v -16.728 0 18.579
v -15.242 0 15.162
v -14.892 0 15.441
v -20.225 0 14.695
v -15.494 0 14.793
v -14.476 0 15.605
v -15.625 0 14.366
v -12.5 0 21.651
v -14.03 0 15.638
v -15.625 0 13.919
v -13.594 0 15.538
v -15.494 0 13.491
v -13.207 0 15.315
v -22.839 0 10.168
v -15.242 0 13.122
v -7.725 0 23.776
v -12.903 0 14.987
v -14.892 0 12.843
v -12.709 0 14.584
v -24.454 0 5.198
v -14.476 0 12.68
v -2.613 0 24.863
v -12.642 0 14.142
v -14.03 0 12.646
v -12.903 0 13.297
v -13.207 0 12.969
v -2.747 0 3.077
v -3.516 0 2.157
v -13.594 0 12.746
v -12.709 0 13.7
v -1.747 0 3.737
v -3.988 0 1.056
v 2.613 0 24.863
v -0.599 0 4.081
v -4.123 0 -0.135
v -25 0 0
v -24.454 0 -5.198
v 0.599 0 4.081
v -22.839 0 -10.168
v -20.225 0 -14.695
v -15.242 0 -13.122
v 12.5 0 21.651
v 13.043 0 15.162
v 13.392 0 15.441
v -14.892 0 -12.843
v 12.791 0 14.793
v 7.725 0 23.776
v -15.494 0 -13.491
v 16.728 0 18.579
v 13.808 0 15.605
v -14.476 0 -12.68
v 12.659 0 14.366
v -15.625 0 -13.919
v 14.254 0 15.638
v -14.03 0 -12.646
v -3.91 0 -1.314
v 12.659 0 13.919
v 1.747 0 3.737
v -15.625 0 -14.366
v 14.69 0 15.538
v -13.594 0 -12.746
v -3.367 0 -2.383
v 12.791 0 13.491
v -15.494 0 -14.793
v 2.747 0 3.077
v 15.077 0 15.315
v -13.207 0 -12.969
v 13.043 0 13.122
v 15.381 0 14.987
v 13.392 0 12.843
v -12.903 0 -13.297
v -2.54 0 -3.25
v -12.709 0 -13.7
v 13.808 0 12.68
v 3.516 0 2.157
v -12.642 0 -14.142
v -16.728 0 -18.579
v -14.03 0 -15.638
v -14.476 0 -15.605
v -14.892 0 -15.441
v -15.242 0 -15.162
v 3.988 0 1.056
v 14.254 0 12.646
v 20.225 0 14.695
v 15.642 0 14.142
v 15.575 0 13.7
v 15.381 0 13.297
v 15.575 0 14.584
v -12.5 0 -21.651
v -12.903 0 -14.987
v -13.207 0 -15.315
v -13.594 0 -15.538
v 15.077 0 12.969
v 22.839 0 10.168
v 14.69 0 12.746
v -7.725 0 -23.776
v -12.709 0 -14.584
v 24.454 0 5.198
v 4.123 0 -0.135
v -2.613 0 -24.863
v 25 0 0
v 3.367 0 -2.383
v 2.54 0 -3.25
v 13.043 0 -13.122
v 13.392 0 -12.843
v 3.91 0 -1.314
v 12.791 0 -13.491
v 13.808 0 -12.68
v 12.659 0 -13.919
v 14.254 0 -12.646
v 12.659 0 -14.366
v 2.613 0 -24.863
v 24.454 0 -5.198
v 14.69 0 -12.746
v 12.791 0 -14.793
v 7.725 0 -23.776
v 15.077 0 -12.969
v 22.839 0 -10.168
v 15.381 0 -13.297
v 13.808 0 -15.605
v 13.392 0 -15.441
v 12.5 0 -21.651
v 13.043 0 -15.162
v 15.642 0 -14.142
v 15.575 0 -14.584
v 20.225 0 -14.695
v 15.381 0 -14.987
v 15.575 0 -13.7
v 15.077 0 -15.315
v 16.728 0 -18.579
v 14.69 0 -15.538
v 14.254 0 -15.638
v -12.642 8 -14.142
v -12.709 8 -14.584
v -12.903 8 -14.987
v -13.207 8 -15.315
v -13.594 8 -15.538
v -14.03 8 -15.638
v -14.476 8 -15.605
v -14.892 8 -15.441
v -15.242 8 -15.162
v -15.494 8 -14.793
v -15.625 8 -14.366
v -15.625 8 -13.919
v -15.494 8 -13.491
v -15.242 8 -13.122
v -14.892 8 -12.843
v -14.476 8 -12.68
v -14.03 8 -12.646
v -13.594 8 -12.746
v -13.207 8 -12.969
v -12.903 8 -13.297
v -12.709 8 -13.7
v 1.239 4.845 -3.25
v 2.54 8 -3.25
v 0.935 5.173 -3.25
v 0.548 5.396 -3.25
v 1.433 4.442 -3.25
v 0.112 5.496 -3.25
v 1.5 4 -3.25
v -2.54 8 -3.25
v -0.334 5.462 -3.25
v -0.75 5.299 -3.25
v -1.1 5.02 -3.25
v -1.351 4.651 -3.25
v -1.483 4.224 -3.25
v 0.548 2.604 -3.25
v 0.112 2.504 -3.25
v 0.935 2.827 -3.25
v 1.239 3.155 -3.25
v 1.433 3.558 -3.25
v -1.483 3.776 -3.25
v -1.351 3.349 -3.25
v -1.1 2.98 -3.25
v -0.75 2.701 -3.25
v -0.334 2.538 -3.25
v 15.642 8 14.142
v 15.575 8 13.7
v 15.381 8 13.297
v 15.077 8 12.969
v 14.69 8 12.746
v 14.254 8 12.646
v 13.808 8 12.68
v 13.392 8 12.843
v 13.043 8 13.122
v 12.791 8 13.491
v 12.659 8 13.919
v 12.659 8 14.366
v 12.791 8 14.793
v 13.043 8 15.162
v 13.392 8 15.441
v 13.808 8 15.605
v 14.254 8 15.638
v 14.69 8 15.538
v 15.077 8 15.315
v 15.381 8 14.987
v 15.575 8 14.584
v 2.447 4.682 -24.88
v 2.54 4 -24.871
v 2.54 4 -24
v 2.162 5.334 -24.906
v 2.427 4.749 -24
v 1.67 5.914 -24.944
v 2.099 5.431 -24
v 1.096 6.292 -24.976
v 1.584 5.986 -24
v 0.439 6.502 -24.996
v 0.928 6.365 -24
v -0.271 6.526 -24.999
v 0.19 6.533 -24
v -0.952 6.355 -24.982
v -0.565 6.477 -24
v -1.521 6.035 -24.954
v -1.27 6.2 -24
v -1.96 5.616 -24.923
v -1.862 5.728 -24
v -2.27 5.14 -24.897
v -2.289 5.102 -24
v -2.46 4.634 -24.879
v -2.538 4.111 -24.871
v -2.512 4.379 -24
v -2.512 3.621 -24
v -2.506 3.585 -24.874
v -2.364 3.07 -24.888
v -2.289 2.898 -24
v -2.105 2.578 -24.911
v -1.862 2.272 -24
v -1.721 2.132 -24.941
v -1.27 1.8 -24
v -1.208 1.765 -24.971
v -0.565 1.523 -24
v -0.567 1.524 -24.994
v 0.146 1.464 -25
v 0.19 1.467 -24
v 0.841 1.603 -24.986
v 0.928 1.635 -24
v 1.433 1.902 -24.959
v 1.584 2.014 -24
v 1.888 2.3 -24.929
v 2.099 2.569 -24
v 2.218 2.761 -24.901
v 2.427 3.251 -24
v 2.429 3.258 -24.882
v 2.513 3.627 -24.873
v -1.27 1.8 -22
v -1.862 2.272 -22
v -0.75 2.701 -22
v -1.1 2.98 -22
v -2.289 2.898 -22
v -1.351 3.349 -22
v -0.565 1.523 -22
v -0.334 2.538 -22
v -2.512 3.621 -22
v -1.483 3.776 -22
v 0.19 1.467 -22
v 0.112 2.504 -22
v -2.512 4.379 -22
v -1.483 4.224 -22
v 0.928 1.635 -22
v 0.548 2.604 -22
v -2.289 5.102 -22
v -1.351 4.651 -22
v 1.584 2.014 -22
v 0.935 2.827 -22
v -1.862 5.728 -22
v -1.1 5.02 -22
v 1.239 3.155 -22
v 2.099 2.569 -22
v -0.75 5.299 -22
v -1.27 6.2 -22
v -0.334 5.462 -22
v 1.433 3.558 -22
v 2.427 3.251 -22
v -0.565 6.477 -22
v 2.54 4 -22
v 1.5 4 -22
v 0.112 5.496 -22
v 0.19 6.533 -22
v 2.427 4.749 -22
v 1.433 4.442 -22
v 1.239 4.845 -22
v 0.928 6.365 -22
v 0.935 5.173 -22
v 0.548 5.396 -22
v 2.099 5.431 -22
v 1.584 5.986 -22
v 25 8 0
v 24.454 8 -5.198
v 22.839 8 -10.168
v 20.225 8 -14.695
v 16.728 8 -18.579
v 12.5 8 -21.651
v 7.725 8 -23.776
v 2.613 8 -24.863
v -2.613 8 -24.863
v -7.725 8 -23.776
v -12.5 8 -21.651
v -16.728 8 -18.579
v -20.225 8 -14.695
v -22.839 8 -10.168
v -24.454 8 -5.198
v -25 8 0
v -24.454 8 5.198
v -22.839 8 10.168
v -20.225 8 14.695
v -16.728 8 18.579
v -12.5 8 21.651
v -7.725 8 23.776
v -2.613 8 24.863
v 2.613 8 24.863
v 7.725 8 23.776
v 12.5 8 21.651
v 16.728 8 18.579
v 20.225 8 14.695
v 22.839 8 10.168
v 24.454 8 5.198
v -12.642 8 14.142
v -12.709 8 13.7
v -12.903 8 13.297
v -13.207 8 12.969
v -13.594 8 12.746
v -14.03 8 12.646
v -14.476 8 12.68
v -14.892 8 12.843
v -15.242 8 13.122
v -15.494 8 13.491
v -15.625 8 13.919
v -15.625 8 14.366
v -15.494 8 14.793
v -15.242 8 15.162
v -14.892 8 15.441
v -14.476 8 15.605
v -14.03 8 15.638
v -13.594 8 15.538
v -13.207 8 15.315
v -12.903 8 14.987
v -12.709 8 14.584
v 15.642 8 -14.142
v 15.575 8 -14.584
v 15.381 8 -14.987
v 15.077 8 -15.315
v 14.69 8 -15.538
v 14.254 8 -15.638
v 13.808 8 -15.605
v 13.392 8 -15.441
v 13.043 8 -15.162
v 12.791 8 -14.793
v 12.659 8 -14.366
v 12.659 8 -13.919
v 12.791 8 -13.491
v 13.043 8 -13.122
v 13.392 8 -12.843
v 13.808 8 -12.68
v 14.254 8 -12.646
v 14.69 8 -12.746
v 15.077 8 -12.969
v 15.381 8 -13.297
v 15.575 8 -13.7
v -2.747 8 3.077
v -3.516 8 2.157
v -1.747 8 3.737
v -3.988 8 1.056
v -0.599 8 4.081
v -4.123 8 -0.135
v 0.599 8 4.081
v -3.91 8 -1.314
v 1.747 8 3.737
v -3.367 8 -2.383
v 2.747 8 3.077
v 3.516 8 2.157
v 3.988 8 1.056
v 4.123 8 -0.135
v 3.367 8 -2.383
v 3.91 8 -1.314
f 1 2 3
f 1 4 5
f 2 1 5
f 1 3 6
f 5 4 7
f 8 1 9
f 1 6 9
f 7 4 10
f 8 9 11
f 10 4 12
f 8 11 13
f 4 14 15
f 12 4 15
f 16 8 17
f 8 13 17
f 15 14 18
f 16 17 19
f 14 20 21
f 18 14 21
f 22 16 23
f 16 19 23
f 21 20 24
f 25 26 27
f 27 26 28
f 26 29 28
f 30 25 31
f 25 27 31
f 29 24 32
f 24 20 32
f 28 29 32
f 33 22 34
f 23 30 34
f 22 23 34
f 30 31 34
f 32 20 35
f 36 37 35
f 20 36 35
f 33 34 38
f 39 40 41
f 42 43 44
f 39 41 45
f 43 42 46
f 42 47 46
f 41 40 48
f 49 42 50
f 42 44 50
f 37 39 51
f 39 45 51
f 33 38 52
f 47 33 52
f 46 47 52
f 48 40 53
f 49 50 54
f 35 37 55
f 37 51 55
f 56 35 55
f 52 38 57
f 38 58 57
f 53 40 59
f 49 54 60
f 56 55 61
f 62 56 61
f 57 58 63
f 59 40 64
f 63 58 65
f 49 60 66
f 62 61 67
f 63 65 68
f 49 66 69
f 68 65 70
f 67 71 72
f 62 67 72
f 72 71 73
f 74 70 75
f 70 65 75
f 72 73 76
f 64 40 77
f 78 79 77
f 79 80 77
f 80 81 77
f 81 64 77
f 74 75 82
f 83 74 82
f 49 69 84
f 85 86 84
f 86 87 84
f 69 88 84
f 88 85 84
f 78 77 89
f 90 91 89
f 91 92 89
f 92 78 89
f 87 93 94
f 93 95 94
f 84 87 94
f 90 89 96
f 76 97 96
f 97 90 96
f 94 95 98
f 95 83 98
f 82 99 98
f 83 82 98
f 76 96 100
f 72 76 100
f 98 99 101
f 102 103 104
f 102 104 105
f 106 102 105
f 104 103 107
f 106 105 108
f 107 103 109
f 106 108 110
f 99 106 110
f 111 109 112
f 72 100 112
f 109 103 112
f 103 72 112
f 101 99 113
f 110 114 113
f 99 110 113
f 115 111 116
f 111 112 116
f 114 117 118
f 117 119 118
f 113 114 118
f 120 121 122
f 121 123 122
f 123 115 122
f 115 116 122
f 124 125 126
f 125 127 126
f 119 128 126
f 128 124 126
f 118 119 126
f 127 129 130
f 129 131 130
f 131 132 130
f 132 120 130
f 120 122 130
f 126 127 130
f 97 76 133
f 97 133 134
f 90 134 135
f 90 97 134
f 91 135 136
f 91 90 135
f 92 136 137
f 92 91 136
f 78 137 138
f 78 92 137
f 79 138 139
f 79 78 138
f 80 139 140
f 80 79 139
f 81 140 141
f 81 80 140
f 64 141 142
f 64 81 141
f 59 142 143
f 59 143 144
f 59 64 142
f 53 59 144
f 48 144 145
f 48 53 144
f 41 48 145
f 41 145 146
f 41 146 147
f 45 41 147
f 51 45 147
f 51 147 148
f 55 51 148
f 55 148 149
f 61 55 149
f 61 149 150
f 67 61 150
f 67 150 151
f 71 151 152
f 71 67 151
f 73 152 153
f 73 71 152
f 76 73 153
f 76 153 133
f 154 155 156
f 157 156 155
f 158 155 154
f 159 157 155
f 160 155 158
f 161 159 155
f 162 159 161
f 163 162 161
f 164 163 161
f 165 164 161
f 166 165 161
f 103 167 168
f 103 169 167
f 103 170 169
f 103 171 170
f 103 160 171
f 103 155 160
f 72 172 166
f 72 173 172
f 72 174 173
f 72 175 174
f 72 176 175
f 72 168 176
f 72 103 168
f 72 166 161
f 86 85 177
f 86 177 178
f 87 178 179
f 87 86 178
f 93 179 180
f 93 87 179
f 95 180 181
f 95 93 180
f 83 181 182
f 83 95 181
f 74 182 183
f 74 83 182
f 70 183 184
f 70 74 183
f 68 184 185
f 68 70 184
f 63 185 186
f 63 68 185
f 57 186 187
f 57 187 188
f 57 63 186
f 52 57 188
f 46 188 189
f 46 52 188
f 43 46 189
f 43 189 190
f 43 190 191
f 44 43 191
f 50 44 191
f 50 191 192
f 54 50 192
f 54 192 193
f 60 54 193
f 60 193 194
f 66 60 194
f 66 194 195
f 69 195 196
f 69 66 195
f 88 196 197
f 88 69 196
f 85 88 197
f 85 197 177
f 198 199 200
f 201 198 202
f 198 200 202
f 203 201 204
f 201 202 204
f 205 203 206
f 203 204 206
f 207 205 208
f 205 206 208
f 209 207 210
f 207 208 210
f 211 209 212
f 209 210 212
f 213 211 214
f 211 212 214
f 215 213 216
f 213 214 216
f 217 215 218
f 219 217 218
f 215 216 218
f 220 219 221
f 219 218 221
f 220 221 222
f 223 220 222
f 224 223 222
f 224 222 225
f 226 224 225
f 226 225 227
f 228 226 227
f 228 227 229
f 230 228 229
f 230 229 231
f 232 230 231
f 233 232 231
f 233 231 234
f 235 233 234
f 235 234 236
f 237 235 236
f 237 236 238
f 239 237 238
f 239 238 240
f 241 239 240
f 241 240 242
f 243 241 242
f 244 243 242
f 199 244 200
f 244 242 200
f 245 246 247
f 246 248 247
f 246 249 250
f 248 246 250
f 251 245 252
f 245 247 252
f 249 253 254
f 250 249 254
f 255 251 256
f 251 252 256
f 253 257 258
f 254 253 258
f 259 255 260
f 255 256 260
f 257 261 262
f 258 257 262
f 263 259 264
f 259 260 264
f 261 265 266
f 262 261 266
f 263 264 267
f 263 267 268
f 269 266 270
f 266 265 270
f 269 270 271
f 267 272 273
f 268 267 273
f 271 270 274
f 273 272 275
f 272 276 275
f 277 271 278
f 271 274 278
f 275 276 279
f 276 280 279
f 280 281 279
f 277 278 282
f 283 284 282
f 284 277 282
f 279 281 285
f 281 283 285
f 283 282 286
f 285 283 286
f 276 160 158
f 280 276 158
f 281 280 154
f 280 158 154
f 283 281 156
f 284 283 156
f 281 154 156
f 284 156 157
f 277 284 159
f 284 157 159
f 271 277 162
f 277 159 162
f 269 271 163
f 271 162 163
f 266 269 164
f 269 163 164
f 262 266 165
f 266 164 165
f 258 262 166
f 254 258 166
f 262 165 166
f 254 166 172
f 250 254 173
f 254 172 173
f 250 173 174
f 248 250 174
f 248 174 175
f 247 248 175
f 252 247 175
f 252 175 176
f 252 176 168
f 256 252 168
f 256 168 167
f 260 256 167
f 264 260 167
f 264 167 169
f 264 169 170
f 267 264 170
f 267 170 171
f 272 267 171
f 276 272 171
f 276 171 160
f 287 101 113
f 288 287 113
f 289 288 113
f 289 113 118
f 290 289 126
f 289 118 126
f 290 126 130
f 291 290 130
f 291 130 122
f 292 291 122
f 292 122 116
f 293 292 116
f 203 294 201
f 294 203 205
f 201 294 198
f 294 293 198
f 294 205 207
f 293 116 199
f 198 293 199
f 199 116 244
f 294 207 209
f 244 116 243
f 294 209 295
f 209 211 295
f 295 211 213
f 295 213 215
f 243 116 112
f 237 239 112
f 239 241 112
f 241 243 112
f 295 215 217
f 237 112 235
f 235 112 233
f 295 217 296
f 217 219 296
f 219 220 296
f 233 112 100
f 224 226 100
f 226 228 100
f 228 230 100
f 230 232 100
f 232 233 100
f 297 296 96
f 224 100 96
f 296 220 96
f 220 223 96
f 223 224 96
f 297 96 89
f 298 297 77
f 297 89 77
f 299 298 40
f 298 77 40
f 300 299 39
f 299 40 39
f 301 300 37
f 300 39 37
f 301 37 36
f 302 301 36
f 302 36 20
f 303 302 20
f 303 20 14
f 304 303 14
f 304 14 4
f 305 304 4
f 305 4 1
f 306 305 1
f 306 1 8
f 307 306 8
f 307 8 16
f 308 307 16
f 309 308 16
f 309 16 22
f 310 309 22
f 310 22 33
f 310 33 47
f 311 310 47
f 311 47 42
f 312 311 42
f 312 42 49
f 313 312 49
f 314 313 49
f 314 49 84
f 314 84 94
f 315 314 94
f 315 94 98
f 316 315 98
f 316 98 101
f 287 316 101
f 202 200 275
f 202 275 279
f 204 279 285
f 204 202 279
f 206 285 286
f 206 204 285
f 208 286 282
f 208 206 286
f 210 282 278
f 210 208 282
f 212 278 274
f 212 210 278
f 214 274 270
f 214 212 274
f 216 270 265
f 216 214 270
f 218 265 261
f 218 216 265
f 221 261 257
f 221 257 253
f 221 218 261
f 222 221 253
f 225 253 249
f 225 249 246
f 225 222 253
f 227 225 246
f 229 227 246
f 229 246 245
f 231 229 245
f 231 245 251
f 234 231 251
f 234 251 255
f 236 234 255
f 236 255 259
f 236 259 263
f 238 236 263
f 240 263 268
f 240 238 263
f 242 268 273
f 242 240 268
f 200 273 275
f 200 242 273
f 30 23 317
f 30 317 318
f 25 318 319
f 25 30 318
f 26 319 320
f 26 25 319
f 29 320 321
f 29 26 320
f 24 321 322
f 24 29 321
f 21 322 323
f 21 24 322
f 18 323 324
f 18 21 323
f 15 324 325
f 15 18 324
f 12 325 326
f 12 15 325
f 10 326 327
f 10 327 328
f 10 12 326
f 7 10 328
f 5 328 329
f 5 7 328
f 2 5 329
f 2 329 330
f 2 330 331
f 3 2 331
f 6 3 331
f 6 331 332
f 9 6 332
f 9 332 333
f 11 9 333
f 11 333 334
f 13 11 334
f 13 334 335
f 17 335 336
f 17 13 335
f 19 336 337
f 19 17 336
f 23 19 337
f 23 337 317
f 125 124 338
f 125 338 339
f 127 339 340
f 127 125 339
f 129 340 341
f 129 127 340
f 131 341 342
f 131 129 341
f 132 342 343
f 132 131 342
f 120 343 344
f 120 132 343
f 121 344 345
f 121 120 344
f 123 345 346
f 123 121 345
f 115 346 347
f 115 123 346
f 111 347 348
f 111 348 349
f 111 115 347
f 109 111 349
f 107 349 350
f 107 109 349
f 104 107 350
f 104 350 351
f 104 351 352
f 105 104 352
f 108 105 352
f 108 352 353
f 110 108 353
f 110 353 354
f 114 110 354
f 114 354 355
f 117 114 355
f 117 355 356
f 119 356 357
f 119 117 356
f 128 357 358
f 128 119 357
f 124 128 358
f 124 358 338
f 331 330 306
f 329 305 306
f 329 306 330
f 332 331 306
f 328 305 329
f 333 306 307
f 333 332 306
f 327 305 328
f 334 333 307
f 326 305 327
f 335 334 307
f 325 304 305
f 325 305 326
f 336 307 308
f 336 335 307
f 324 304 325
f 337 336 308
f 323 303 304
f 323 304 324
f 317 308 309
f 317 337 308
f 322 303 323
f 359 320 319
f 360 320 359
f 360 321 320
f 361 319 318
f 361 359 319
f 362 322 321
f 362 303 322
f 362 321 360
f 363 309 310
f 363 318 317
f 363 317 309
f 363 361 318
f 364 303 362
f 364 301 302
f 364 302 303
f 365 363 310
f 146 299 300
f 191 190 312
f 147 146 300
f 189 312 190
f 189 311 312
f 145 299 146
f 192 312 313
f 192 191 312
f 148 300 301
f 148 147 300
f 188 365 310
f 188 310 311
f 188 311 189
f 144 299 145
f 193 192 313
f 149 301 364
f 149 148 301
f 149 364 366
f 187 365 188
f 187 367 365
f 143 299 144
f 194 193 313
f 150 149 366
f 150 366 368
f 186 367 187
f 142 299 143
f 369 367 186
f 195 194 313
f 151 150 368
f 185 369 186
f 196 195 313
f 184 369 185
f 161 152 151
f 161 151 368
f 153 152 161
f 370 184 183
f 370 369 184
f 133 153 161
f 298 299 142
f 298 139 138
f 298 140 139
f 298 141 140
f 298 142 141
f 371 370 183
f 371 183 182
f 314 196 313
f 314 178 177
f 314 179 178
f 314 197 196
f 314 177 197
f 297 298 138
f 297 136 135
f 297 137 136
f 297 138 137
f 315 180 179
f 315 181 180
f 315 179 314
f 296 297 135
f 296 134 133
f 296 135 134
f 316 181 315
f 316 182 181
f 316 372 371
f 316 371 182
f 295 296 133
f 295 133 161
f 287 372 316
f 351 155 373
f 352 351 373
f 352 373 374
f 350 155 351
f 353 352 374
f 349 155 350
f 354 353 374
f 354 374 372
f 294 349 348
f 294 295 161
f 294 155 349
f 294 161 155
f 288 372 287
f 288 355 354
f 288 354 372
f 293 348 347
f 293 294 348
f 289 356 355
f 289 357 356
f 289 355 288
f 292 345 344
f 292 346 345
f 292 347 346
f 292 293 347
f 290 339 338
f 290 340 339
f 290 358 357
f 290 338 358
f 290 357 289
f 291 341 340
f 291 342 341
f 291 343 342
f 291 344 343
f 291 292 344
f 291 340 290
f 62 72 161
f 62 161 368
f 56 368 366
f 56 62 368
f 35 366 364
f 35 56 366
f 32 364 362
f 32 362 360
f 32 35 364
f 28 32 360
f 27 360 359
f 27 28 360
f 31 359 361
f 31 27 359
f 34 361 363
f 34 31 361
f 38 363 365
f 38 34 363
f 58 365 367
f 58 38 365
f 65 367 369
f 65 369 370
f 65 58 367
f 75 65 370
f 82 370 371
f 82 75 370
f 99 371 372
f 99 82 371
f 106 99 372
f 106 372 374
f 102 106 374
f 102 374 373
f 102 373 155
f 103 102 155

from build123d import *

# Parameters (mm, degrees)
SKETCH1_R               = 25
SKETCH1_R_2             = 1.5
BOSS_EXTRUDE1_DEPTH     = 8
SKETCH2_R               = 1.5
CUT_EXTRUDE1_DEPTH      = 35
SKETCH3_R               = 2.540300179
CUT_EXTRUDE3_DEPTH      = 2
CUT_EXTRUDE3_DEPTH_BACK = 35


with BuildPart() as part:
    # Sketch1 → Boss-Extrude1 (new body)
    with BuildSketch(Plane(origin=(0, 0, 0), x_dir=(1, 0, 0), z_dir=(0, 1, 0))):
        Circle(SKETCH1_R)
        with Locations((-14.142135624, -14.142135624)):
            Circle(SKETCH1_R_2, mode=Mode.SUBTRACT)
        with Locations((-14.142135624, 14.142135624)):
            Circle(SKETCH1_R_2, mode=Mode.SUBTRACT)
        with Locations((14.142135624, 14.142135624)):
            Circle(SKETCH1_R_2, mode=Mode.SUBTRACT)
        with Locations((14.142135624, -14.142135624)):
            Circle(SKETCH1_R_2, mode=Mode.SUBTRACT)
        with BuildLine():
            Line((2.540300179, 3.25), (-2.540300179, 3.25))
            ThreePointArc((-2.540300179, 3.25), (0, -4.125), (2.540300179, 3.25))
        make_face(mode=Mode.SUBTRACT)
    extrude(amount=BOSS_EXTRUDE1_DEPTH)

    # Sketch2 → Cut-Extrude1 (cut)
    with BuildSketch(Plane.XY.offset(-3.25)):
        with Locations((0, 4)):
            Circle(SKETCH2_R)
    extrude(amount=-CUT_EXTRUDE1_DEPTH, mode=Mode.SUBTRACT)

    # Sketch3 → Cut-Extrude3 (cut, two sides)
    with BuildSketch(Plane.XY.offset(-24)) as cut_extrude3_sk:
        with Locations((0, 4)):
            Circle(SKETCH3_R)
    extrude(amount=CUT_EXTRUDE3_DEPTH, mode=Mode.SUBTRACT)
    extrude(cut_extrude3_sk.sketch, amount=-CUT_EXTRUDE3_DEPTH_BACK, mode=Mode.SUBTRACT)


solid = part.part
